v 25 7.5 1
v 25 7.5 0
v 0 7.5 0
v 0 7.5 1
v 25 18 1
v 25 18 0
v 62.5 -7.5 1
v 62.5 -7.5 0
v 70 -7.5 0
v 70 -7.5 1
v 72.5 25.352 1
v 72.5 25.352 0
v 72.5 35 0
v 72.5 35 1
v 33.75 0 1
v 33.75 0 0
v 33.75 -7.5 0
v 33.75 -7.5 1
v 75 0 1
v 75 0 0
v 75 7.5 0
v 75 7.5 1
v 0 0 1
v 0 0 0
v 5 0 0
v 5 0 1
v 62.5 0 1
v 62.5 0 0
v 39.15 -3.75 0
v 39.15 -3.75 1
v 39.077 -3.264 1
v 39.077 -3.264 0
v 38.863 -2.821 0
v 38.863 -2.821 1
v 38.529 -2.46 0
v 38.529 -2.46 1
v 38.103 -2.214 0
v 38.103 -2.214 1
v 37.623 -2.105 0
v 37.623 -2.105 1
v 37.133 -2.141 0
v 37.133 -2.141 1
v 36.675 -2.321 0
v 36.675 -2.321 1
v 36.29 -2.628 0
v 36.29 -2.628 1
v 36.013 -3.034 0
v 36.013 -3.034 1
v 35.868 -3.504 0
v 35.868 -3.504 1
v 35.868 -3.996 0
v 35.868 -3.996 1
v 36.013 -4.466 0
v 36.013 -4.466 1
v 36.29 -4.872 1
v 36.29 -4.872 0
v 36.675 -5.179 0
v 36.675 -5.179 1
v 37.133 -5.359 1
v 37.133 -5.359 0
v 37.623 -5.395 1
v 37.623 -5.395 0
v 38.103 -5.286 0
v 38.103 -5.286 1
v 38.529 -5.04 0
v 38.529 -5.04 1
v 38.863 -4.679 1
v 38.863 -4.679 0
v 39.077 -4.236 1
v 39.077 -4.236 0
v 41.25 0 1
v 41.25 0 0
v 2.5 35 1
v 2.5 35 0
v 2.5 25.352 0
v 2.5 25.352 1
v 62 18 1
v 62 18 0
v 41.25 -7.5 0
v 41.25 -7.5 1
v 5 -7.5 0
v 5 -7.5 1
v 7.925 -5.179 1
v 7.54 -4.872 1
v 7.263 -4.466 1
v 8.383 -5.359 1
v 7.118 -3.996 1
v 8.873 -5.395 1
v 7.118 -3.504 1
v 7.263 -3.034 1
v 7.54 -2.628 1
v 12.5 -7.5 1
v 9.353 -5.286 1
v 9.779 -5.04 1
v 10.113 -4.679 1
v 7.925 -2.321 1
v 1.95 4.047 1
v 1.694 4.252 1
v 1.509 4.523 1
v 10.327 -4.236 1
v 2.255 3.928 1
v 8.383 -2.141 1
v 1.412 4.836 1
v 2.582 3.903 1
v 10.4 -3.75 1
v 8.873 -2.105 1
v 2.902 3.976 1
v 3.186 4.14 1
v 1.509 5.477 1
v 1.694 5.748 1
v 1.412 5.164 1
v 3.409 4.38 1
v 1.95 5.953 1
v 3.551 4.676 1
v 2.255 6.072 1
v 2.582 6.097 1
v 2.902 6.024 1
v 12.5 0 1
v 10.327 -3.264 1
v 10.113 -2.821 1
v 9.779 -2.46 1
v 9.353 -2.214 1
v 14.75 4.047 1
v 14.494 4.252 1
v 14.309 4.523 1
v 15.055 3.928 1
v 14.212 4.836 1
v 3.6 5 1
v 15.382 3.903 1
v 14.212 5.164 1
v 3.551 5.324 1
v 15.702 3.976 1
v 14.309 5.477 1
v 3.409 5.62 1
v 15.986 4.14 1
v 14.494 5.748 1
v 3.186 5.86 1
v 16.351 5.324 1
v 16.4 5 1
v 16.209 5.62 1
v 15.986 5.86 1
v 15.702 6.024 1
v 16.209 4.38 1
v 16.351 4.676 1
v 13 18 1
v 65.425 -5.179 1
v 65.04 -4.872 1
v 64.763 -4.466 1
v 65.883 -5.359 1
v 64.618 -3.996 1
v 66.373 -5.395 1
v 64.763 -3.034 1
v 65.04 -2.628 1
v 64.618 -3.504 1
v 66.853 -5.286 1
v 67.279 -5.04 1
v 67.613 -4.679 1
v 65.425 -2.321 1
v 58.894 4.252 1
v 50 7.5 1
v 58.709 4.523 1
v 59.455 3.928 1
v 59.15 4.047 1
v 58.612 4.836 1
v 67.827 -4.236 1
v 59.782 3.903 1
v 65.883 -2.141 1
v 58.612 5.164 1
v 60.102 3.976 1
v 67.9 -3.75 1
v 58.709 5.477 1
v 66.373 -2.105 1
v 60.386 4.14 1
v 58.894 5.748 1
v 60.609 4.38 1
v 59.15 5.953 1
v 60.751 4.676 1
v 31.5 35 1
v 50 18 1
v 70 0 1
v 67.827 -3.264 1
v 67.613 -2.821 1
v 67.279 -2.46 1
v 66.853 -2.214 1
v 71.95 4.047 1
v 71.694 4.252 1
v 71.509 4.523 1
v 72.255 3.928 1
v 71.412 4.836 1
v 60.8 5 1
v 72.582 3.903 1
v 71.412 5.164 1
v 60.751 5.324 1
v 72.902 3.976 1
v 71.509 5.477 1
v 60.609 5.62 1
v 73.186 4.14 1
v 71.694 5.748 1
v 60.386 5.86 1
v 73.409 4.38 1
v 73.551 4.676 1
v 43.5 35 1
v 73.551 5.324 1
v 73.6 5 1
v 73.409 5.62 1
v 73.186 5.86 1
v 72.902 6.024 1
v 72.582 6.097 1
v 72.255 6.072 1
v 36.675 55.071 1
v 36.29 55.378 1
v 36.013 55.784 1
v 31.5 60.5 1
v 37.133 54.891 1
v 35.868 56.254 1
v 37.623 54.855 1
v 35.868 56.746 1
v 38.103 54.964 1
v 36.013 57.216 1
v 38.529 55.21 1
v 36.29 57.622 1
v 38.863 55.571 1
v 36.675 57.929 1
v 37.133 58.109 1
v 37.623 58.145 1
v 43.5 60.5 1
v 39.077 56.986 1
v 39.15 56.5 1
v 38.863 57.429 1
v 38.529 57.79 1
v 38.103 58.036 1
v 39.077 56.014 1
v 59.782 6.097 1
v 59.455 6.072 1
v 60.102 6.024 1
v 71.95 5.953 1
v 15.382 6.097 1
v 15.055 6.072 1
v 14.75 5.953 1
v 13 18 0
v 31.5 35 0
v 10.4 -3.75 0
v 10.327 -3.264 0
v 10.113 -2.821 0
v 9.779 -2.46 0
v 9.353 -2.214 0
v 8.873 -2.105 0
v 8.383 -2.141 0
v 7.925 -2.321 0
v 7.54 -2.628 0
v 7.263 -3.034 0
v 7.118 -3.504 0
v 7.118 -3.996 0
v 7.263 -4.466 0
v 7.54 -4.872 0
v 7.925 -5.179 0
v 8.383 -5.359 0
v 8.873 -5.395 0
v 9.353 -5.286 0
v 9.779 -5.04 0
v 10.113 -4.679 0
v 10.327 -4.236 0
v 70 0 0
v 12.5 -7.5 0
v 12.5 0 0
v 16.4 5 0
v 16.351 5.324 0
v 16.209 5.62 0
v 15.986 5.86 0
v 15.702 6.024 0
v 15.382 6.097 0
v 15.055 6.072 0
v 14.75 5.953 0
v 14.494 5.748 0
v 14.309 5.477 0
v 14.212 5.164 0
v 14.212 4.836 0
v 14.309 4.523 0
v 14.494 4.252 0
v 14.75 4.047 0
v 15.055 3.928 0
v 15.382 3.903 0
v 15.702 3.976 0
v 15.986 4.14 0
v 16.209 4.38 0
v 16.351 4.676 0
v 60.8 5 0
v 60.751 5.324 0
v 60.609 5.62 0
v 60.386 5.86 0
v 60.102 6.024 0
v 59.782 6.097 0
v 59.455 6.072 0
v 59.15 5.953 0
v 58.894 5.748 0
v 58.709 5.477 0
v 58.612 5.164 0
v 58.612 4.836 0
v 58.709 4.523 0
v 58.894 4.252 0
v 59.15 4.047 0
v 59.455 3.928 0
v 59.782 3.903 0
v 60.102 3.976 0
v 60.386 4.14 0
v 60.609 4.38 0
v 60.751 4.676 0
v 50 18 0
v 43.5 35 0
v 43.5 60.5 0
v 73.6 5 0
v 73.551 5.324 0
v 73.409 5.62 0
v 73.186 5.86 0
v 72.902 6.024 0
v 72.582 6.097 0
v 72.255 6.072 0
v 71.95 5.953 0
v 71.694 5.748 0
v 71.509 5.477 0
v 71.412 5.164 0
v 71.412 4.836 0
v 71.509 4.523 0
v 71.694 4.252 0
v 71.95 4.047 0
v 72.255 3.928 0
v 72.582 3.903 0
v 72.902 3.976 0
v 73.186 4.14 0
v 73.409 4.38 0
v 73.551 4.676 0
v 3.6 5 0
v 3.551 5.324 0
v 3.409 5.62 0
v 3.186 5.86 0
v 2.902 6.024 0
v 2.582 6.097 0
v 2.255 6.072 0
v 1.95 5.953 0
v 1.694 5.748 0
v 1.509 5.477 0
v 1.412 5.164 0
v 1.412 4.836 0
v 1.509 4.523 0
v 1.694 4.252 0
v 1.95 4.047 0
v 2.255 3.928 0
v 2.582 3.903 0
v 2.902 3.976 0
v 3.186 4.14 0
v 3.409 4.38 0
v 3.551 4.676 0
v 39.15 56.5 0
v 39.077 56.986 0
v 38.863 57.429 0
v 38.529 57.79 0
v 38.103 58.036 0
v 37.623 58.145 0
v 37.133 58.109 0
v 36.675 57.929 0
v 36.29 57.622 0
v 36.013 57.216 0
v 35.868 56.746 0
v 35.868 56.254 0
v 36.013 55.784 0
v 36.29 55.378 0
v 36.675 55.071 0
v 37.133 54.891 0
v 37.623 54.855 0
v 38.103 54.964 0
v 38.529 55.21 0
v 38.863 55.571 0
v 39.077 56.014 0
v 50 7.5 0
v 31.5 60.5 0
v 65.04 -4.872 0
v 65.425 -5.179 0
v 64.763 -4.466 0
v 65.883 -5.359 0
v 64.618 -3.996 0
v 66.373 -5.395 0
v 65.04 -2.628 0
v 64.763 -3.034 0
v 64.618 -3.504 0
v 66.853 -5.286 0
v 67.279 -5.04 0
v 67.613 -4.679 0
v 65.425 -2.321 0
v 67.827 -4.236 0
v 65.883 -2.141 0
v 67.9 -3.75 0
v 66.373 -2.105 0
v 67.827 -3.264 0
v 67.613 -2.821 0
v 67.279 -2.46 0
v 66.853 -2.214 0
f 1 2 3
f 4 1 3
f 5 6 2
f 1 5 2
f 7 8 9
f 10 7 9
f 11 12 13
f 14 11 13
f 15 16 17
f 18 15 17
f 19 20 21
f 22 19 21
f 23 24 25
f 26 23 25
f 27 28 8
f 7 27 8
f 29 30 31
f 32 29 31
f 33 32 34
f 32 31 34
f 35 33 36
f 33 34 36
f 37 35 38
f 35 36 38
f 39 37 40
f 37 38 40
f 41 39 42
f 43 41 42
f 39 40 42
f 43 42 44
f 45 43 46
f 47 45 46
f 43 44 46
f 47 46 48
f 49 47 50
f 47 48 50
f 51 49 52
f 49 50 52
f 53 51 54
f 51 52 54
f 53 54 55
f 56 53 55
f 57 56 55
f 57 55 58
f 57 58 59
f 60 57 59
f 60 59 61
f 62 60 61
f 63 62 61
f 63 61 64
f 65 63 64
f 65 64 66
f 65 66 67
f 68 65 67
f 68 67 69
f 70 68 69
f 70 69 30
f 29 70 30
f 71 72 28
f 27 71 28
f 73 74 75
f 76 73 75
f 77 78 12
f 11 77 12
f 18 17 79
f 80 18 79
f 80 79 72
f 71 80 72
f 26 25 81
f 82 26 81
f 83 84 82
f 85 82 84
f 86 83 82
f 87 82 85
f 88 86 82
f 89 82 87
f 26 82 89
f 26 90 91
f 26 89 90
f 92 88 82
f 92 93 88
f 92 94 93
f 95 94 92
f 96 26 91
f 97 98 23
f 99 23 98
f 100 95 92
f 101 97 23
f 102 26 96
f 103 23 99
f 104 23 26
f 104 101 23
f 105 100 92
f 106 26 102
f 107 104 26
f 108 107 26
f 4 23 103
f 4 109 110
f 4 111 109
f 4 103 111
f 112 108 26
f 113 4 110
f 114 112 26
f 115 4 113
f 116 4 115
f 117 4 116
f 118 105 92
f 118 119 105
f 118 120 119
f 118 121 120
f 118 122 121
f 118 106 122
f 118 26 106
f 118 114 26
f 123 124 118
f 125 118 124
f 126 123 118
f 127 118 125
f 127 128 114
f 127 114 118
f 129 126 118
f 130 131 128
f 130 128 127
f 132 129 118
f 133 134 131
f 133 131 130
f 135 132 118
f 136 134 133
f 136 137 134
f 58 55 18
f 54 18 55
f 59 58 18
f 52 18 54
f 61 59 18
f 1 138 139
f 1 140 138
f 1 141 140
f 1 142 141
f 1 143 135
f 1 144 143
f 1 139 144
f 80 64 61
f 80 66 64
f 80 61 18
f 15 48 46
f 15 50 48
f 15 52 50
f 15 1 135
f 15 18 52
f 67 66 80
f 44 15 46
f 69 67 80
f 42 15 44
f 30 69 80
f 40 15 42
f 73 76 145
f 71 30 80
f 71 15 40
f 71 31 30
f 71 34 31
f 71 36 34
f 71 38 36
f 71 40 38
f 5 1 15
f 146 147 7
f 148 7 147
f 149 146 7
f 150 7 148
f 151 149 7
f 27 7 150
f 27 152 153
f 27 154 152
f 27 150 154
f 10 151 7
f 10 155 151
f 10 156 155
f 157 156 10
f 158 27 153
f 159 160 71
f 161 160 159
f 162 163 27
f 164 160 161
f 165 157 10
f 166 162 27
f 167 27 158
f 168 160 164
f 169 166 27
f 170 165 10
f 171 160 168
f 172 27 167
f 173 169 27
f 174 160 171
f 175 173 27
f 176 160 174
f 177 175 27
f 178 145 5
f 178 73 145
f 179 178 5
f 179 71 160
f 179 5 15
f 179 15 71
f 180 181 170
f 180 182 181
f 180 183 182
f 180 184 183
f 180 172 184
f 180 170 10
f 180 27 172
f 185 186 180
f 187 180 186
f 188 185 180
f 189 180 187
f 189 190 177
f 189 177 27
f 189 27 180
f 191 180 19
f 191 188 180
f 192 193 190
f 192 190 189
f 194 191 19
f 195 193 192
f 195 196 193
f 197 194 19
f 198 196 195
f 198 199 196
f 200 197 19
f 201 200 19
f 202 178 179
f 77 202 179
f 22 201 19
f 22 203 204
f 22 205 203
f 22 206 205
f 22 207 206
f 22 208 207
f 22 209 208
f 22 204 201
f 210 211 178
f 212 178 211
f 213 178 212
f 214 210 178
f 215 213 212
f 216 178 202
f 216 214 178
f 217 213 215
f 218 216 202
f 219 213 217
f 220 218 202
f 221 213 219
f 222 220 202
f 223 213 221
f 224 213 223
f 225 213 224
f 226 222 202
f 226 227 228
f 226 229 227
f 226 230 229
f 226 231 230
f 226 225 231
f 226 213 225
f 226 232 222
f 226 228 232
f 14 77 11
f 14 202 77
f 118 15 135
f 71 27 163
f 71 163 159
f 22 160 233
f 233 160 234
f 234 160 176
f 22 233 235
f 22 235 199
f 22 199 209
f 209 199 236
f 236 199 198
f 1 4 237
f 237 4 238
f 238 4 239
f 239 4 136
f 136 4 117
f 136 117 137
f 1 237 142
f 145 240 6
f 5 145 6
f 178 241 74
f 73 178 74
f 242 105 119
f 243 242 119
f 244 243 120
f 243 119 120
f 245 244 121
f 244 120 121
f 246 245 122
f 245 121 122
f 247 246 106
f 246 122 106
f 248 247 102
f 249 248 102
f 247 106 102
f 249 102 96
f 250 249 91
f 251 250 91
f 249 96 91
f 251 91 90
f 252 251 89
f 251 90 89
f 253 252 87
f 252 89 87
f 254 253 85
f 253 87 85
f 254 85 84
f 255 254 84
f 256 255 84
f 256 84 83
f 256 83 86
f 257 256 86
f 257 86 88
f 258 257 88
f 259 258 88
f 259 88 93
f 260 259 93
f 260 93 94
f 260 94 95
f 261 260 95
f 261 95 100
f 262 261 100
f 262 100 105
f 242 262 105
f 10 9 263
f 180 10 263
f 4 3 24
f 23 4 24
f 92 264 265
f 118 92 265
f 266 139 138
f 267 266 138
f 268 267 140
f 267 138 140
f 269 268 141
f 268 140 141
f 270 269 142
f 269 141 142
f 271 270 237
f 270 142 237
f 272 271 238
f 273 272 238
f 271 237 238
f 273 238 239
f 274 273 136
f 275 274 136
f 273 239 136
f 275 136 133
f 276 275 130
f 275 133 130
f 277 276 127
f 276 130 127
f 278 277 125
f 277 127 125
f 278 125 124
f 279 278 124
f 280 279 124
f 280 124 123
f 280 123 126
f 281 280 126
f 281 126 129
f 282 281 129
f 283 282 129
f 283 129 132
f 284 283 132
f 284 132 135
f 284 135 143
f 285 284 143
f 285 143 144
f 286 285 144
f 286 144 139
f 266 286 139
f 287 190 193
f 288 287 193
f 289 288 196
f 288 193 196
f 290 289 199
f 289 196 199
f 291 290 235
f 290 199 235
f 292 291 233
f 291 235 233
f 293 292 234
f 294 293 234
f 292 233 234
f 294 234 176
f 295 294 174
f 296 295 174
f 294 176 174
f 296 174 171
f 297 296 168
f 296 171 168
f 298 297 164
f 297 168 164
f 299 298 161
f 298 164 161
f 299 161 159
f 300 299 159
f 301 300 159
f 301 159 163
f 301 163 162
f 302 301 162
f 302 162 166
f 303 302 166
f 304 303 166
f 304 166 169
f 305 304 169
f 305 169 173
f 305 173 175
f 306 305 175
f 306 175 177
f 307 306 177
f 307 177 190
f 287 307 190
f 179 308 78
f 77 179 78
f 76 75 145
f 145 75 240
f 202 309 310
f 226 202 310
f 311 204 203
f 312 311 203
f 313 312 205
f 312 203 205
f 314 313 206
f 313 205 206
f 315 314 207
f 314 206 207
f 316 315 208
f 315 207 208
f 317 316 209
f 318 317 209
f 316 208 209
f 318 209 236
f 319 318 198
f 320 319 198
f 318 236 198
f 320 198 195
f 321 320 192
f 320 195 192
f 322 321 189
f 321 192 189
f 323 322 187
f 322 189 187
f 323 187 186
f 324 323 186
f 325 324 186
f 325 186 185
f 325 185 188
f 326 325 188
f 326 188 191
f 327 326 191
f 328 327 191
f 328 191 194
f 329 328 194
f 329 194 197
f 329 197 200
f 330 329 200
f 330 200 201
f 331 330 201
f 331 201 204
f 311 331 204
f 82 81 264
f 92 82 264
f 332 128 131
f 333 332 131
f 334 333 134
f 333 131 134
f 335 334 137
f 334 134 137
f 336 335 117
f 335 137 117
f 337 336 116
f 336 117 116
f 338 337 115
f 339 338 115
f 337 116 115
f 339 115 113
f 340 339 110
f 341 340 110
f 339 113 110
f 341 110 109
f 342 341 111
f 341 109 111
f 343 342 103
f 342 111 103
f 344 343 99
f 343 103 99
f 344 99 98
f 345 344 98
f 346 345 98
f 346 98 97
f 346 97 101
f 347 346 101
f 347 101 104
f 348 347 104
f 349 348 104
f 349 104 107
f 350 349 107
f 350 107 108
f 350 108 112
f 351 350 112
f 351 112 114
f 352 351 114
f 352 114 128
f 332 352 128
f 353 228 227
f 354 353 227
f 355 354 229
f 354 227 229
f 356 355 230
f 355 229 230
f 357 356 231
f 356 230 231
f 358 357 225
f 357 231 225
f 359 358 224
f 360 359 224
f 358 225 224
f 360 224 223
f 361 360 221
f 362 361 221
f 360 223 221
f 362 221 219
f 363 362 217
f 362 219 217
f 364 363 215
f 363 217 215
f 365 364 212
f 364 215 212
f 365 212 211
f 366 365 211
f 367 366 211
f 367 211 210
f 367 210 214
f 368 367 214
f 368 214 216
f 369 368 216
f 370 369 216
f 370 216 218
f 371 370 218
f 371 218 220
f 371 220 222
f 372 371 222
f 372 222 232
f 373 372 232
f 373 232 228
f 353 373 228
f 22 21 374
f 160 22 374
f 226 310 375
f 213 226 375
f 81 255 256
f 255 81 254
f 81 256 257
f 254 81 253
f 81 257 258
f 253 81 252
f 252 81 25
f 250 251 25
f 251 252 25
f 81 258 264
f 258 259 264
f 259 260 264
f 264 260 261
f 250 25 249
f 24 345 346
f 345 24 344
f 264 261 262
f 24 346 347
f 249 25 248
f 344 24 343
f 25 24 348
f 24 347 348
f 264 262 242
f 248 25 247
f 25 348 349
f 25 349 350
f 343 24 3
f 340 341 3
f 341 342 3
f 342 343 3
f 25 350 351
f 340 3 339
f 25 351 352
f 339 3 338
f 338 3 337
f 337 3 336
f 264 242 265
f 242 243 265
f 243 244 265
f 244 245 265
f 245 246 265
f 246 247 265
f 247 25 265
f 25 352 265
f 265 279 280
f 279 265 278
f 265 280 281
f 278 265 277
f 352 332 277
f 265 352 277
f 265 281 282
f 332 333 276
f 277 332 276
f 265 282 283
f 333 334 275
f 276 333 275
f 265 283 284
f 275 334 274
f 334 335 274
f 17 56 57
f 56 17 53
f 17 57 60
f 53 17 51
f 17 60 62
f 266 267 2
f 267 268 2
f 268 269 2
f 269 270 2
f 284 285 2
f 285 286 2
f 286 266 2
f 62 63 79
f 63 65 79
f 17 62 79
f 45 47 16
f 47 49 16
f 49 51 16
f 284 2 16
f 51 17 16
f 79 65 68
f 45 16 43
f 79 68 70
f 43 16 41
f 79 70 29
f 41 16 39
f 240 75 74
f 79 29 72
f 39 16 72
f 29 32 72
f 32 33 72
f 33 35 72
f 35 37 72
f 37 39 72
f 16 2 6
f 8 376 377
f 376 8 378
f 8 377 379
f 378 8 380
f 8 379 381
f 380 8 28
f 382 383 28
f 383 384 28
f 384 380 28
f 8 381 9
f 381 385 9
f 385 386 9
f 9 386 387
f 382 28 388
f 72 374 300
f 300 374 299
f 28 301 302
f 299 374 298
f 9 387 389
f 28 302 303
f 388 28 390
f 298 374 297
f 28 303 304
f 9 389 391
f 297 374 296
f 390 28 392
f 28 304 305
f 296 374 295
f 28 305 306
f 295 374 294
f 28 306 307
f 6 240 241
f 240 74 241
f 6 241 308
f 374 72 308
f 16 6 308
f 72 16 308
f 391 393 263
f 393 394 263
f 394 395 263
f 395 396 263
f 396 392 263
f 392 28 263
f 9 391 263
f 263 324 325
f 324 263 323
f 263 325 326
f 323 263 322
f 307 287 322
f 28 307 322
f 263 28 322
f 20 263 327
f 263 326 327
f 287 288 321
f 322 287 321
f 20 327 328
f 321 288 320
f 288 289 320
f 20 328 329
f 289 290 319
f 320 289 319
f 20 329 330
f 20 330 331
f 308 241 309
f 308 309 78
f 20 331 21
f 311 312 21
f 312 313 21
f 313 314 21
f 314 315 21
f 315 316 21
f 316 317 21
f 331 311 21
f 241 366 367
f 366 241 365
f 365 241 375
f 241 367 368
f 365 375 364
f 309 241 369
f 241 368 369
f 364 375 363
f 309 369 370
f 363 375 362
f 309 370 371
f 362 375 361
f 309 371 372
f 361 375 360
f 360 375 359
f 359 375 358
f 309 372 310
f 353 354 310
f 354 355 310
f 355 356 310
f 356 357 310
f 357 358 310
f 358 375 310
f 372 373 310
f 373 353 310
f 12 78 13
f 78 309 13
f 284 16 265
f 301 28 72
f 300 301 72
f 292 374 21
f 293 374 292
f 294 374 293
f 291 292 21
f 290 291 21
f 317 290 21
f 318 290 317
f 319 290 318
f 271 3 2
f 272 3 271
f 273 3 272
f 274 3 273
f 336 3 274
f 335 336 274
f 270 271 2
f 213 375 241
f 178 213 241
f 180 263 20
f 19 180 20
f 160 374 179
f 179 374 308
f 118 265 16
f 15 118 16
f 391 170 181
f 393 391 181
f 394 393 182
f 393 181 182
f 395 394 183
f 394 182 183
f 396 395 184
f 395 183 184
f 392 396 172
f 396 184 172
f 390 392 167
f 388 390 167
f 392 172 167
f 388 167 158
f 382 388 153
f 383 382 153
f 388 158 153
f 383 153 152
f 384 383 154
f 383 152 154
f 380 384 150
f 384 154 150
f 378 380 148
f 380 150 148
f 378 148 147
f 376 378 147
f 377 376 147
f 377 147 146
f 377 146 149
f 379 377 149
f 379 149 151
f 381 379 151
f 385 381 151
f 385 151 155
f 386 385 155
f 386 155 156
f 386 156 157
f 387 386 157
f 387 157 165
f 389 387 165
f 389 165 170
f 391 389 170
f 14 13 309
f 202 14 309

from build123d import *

# Parameters (mm, degrees)
EXTRUDE_DEPTH = 1
SKETCH001_R   = 1.1
HOLE_DEPTH    = 5
SKETCH002_R   = 1.65
HOLE001_DEPTH = 3


with BuildPart() as part:
    # Sketch → Extrude (new body)
    with BuildSketch(Plane.XY):
        Polygon((0, 0), (5, 0), (5, -7.5), (12.5, -7.5), (12.5, 0), (33.75, 0), (33.75, -7.5), (41.25, -7.5), (41.25, 0), (62.5, 0), (62.5, -7.5), (70, -7.5), (70, 0), (75, 0), (75, 7.5), (50, 7.5), (50, 18), (62, 18), (72.500012, 25.352225), (72.500012, 35), (43.500012, 35), (43.500012, 60.5), (31.500012, 60.5), (31.500012, 35), (2.500012, 35), (2.499988, 25.352225), (13, 18), (25, 18), (25, 7.5), (0, 7.5), align=None)
    extrude(amount=EXTRUDE_DEPTH)

    # Sketch001 (on Face32 of Extrude) → Hole (cut)
    with BuildSketch(Plane.XY.offset(1)):
        with Locations((2.5, 5)):
            Circle(SKETCH001_R)
        with Locations((15.3, 5)):
            Circle(SKETCH001_R)
        with Locations((59.7, 5)):
            Circle(SKETCH001_R)
        with Locations((72.5, 5)):
            Circle(SKETCH001_R)
    extrude(amount=-HOLE_DEPTH, mode=Mode.SUBTRACT)

    # Sketch002 (on Face5 of Hole) → Hole001 (cut)
    with BuildSketch(Plane.XY.offset(1)):
        with Locations((8.75, -3.75)):
            Circle(SKETCH002_R)
        with Locations((37.5, -3.75)):
            Circle(SKETCH002_R)
        with Locations((66.25, -3.75)):
            Circle(SKETCH002_R)
        with Locations((37.5, 56.5)):
            Circle(SKETCH002_R)
    extrude(amount=-HOLE001_DEPTH, mode=Mode.SUBTRACT)


solid = part.part
